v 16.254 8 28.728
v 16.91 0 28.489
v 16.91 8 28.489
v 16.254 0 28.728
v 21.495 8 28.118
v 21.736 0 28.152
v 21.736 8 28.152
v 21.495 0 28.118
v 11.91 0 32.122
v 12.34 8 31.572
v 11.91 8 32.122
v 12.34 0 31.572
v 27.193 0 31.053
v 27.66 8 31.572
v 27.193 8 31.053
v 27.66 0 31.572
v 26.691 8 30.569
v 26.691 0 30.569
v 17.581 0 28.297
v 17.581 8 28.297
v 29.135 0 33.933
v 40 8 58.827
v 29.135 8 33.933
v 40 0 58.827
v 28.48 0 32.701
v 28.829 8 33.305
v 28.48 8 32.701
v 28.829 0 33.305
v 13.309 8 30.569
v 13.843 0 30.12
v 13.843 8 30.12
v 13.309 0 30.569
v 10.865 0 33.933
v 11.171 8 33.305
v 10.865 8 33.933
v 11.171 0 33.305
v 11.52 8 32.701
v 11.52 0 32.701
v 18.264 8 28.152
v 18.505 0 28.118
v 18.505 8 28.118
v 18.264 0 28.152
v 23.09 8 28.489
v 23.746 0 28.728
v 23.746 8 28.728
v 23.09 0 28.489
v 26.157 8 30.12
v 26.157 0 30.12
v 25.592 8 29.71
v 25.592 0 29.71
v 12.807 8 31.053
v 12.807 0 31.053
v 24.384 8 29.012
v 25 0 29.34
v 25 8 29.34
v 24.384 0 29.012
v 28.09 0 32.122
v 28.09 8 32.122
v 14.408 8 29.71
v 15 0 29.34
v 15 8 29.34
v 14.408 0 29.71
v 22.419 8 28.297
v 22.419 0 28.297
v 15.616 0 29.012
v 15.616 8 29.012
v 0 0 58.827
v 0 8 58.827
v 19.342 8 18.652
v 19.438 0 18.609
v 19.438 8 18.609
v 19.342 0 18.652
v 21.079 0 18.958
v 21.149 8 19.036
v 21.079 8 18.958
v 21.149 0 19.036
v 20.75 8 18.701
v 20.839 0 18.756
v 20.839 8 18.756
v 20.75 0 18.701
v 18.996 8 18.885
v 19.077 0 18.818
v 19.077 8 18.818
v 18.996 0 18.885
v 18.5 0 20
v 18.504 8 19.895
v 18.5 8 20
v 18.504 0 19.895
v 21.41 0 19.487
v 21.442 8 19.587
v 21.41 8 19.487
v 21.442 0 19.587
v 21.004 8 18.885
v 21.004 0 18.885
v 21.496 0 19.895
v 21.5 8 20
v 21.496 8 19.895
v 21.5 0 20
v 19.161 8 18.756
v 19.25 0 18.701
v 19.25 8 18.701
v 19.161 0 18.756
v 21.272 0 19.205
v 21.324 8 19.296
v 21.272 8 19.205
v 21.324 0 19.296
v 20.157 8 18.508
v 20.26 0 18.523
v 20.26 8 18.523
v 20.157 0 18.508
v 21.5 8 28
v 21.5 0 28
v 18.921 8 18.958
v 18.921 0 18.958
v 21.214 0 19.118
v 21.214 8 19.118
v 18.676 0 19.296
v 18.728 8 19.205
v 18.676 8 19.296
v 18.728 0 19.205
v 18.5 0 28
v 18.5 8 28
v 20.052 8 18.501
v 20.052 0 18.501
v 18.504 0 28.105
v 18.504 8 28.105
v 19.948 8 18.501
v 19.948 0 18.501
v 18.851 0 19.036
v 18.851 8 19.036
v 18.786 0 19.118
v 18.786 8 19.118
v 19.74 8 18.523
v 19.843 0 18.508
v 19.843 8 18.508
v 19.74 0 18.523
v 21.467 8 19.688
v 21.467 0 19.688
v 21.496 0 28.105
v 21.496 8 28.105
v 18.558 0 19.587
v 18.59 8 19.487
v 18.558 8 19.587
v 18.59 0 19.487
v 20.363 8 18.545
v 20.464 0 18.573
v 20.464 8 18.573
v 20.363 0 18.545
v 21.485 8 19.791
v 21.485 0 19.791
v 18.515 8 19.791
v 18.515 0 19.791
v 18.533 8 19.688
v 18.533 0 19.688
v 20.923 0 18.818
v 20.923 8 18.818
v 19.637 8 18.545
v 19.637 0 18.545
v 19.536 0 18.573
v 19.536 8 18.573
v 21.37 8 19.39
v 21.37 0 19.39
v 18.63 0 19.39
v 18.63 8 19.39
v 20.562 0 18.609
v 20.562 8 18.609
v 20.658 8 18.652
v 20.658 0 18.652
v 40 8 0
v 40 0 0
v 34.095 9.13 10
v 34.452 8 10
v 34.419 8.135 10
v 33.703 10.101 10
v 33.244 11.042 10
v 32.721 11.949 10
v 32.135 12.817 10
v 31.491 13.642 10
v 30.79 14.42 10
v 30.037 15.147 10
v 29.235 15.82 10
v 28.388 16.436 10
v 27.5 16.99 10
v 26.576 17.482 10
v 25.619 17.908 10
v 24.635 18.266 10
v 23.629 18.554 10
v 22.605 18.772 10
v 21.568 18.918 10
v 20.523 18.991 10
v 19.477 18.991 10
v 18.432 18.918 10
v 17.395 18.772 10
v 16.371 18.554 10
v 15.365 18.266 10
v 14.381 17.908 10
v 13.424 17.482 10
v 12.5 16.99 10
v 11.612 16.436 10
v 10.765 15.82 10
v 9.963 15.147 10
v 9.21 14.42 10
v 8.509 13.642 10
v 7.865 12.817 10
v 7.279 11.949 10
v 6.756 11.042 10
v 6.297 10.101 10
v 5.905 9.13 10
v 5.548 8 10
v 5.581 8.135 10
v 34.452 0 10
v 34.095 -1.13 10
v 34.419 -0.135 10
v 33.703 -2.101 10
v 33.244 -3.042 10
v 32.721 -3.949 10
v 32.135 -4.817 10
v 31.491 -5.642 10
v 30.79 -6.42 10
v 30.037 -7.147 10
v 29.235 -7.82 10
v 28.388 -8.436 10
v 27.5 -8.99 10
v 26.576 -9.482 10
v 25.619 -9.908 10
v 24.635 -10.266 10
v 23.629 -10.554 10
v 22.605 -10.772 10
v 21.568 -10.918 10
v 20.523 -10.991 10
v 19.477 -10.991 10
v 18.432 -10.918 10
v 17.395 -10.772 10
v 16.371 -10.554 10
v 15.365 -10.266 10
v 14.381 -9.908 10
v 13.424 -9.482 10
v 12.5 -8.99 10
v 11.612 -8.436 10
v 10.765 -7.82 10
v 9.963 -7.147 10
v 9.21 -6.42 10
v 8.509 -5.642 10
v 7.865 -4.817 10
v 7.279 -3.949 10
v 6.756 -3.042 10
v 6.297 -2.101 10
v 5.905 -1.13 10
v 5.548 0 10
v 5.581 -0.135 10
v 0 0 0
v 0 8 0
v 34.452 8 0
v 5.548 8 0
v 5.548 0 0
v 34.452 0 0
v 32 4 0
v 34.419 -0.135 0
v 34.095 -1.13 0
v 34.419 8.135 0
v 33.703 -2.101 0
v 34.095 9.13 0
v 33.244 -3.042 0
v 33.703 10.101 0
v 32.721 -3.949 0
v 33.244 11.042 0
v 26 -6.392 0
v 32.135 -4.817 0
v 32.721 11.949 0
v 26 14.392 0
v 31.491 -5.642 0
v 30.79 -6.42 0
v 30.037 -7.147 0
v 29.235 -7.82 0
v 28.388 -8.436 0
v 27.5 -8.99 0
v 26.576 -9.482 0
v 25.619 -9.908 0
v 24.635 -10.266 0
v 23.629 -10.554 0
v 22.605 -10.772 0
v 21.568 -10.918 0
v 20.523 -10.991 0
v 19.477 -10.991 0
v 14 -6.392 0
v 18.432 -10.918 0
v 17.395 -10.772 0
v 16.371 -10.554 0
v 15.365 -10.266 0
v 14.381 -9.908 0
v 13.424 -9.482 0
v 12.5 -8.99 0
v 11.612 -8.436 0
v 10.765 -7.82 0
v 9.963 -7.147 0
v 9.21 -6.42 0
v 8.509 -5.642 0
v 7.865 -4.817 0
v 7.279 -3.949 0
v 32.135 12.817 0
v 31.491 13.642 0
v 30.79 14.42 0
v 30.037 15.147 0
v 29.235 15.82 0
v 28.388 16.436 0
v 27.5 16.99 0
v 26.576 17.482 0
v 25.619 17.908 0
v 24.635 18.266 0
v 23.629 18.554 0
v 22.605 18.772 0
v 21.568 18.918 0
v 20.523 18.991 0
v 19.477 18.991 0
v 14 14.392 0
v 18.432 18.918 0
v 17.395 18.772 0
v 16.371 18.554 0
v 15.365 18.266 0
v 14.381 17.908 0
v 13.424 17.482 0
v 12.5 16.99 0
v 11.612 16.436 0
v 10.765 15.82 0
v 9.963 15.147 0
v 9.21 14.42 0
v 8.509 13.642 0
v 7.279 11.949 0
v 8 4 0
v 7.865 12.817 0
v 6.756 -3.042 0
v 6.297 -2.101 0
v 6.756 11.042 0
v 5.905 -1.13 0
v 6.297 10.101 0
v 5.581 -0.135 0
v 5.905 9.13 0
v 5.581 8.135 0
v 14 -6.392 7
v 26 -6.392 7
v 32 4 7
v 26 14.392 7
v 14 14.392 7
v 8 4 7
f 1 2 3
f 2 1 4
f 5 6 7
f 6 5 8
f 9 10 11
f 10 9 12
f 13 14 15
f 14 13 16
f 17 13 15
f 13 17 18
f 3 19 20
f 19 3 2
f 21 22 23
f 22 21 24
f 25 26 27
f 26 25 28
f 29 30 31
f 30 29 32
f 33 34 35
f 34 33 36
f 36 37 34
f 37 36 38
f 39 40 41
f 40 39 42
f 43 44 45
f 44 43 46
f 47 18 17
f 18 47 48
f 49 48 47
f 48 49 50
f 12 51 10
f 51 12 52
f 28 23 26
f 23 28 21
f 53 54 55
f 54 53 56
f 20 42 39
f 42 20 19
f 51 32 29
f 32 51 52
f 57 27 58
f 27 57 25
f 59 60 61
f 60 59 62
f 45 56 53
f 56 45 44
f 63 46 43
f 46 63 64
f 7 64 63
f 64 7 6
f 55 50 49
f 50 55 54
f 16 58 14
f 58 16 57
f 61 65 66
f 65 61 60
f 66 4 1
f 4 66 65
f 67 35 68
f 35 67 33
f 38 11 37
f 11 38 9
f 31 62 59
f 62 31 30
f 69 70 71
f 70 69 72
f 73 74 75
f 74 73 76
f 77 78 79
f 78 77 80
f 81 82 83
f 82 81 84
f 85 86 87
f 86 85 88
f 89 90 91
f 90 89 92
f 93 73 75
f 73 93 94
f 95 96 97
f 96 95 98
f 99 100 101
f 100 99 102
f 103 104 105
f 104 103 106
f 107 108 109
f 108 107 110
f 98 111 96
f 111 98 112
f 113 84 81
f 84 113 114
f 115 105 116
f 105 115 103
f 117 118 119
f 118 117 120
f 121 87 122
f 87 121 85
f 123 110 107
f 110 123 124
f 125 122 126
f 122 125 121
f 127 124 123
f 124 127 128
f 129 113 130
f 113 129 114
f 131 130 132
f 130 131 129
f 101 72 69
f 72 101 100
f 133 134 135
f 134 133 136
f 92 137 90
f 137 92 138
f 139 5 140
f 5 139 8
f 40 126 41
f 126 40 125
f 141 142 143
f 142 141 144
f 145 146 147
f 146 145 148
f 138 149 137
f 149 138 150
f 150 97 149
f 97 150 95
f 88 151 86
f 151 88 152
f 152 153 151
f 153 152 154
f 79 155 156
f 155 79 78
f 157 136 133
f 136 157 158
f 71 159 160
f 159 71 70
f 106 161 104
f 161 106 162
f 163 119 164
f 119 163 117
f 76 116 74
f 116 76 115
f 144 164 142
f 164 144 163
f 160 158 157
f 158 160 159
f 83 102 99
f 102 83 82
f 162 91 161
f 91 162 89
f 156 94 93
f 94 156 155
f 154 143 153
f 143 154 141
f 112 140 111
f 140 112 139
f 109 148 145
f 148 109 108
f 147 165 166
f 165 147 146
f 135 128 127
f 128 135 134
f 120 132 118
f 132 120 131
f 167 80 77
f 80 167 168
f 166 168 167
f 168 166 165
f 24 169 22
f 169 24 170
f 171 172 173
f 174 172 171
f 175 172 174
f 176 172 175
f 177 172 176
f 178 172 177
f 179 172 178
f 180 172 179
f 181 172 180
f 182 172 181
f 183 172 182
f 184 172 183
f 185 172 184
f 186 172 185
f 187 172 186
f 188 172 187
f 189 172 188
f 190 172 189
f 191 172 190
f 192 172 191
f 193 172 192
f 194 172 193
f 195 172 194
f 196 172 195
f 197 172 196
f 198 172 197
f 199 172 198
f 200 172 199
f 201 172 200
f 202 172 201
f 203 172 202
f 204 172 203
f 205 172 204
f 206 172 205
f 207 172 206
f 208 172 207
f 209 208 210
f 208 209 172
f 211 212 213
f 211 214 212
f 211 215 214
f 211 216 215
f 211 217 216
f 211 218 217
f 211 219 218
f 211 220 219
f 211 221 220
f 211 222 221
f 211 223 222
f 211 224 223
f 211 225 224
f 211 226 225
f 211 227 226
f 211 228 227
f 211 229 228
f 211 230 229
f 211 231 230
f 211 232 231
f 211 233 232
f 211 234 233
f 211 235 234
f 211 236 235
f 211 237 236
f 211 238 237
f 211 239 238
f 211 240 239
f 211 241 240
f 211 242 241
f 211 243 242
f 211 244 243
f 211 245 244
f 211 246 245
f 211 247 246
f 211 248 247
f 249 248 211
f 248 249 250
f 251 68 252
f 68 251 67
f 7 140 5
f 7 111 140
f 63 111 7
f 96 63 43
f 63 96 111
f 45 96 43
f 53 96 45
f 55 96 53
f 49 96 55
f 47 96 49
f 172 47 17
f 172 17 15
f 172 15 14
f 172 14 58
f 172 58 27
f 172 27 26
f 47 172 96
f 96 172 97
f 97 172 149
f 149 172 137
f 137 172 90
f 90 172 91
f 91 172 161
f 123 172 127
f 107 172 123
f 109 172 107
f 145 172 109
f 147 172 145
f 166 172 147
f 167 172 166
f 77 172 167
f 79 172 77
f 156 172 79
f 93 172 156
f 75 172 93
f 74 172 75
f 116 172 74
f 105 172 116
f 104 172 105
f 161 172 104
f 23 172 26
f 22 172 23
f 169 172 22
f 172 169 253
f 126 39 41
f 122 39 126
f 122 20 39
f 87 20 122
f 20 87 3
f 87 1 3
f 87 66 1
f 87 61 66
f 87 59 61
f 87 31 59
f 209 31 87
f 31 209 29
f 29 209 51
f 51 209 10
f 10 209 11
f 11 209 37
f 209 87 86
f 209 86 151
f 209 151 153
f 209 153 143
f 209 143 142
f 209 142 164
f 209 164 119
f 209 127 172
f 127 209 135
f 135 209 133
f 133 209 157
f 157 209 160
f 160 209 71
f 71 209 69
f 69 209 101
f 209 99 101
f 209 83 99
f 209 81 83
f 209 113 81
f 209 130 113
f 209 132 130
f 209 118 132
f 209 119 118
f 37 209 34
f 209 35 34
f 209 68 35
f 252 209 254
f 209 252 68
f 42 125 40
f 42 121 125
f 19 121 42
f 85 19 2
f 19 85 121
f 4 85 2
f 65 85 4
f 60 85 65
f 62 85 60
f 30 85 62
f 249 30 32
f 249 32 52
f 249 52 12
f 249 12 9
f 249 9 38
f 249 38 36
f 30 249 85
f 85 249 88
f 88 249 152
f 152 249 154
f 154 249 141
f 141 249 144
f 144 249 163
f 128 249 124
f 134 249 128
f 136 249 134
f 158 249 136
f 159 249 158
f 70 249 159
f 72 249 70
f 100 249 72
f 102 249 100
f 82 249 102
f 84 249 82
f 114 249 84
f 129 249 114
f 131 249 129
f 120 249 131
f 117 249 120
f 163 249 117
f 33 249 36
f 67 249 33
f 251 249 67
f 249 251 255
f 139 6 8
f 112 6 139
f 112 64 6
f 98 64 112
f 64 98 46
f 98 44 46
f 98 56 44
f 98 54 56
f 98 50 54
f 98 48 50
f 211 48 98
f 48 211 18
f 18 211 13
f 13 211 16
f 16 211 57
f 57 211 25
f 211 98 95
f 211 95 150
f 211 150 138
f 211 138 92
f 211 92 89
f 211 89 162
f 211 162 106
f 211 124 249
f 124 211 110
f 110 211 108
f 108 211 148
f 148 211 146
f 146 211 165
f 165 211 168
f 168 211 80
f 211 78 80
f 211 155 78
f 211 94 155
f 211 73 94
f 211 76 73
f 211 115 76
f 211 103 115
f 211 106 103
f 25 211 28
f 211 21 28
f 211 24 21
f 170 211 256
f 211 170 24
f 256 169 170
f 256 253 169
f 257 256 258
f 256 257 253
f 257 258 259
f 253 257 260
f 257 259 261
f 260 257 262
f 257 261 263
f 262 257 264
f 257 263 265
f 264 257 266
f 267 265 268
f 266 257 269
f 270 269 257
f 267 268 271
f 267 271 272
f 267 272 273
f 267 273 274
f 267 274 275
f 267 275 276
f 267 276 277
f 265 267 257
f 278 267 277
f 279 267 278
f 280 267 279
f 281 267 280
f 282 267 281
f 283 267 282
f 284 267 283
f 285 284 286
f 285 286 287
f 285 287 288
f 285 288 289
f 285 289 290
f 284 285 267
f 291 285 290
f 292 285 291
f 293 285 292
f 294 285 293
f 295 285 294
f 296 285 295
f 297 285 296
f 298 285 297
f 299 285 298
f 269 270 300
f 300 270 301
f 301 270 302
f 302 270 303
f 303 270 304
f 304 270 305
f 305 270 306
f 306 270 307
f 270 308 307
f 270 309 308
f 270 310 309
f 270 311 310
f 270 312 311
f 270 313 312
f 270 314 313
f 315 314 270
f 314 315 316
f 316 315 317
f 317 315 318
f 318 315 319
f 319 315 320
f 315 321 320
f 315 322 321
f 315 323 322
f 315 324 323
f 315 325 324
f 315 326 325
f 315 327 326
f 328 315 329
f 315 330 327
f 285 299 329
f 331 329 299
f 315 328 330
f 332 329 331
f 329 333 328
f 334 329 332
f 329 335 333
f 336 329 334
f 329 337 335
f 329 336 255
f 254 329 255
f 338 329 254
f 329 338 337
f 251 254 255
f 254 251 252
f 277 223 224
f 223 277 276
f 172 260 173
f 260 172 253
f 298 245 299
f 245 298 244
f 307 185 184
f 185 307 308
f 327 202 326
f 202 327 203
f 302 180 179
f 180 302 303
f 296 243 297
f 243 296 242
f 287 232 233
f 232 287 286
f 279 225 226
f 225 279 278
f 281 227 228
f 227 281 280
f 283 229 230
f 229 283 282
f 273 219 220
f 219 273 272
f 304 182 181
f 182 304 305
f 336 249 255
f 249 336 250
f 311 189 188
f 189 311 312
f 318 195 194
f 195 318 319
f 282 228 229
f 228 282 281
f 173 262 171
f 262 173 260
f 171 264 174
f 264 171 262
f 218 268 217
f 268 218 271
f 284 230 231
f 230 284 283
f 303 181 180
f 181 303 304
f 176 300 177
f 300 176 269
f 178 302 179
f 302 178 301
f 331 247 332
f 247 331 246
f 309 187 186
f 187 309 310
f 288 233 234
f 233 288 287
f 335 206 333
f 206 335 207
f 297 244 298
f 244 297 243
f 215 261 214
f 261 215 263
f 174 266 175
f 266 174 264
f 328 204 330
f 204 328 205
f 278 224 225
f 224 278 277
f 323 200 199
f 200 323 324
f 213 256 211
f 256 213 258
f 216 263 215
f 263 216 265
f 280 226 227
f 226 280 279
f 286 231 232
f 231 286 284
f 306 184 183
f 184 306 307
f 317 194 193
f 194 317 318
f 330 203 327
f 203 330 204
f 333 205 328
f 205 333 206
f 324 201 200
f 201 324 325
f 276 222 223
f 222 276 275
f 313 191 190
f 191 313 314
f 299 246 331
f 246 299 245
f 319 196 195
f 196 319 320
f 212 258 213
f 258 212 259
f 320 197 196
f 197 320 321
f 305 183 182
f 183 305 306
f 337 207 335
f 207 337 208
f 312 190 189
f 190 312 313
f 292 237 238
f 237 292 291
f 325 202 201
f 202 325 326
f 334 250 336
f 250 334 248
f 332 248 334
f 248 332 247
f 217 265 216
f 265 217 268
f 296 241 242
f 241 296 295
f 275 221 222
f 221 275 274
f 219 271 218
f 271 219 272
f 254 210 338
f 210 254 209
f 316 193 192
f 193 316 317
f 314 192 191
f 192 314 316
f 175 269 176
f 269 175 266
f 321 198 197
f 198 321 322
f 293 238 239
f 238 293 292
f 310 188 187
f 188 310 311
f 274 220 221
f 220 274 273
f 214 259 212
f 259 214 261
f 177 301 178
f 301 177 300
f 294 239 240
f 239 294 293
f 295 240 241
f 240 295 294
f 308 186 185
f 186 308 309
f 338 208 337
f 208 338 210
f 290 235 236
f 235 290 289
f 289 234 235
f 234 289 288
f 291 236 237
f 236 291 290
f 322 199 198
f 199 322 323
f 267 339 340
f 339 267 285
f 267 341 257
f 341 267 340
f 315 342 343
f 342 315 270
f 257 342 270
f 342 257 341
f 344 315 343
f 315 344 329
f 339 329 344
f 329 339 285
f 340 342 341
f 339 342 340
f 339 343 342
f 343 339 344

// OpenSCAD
blockWidth = 40;
blockHeight = 50;
blockDepth = 8;
rodDia = 20;
rodDiaVShape = 20; //added to rodDia for v-Shape
stringSpaceUse = 1; //add space for the string
stringSpaceHeight = 8;
sringSpaceWidth = 3;
baseHexUse = 1;
baseHeight = 10;
baseHexHexDia = 12; // corner-to-corner NOT base-to-base
baseHexThickness = 3;

$fn = 90;
//math
rodRad = rodDia/2;

//logic


//block
module block(blockWidth,blockDepth,blockHeight,stringSpaceUse,stringSpaceHeight) {
  difference() {
    cube([blockWidth,blockDepth,blockHeight]);
    if (stringSpaceUse == 1) {
      translate([blockWidth/2,blockDepth/2,rodDia+stringSpaceHeight]) {
        rotate([90,0,0]) {
          hull() {
            cylinder(r=rodRad, h=blockDepth+2, center=true);
            translate([0,blockHeight,0]) {
              cylinder(r=rodRad+rodDiaVShape, h=blockDepth+2, center=true);
            }
          }
          translate([0,-rodRad,0]){
            hull() {
              rotate([90,0,0]) {
                rotate([90,0,0]) {
                  cylinder(r=sringSpaceWidth/2, h=blockDepth+2, center=true);
                }
                translate([0, 0, stringSpaceHeight]) {
                  rotate([90, 00, 00]) {
                    cylinder(r=sringSpaceWidth/2, h=blockDepth+2, center=true);
                  }
                }
              }
            }
          }
        }
      }
    } else {
      translate([blockWidth/2,blockDepth/2,rodDia]) {
        rotate([90,0,0]) {
          hull() {
            cylinder(r=rodRad, h=blockDepth+2, center=true);
            translate([0,blockHeight,0]) {
              cylinder(r=rodRad+rodDiaVShape, h=blockDepth+2, center=true);
            }
          }
        }
      }
    }
  }
}

//baseHex
module baseHex(baseHeight,baseHexHexDia,blockWidth,blockDepth) {
  difference(){
  translate([]){
    cube([blockWidth,blockDepth,baseHeight]);
      translate([blockWidth/2,blockDepth/2,baseHeight/2]){
        cylinder(r=baseHexHexDia+baseHexThickness, h=baseHeight, center=true);
      }
    }
    translate([blockWidth/2,blockDepth/2,baseHeight/2-baseHexThickness]){
      cylinder(r=baseHexHexDia, h=baseHeight, center=true, $fn=6);
    }
  }
}


// hRadius : radius of the stock cylinder
// hLength : length of the stock cylinder
// hTwist  : amount of twist (in degrees)
// hN      : number of sectors
// hGap    : size of clearance gap for sliding surfaces
module helicoid(hRadius,hLength,hTwist,hN,hGap)
{
 hSlices=10*hLength;
 linear_extrude(height=hLength,twist = hTwist,center=true,slices=hSlices)
 projection(cut=true)
 {
  for(i=[1:hN])
  {
   rotate(a=[0,0,(360*i)/hN])
    translate([-hGap,-hGap/2,-1])
     cube([hRadius+hGap,hGap,2]);
  }
 }
}


translate([0,0,baseHeight]){
  block(blockWidth,blockDepth,blockHeight,stringSpaceUse,stringSpaceHeight);
}
if (baseHexUse == 1) {
  baseHex(baseHeight,baseHexHexDia,blockWidth,blockDepth);
}
